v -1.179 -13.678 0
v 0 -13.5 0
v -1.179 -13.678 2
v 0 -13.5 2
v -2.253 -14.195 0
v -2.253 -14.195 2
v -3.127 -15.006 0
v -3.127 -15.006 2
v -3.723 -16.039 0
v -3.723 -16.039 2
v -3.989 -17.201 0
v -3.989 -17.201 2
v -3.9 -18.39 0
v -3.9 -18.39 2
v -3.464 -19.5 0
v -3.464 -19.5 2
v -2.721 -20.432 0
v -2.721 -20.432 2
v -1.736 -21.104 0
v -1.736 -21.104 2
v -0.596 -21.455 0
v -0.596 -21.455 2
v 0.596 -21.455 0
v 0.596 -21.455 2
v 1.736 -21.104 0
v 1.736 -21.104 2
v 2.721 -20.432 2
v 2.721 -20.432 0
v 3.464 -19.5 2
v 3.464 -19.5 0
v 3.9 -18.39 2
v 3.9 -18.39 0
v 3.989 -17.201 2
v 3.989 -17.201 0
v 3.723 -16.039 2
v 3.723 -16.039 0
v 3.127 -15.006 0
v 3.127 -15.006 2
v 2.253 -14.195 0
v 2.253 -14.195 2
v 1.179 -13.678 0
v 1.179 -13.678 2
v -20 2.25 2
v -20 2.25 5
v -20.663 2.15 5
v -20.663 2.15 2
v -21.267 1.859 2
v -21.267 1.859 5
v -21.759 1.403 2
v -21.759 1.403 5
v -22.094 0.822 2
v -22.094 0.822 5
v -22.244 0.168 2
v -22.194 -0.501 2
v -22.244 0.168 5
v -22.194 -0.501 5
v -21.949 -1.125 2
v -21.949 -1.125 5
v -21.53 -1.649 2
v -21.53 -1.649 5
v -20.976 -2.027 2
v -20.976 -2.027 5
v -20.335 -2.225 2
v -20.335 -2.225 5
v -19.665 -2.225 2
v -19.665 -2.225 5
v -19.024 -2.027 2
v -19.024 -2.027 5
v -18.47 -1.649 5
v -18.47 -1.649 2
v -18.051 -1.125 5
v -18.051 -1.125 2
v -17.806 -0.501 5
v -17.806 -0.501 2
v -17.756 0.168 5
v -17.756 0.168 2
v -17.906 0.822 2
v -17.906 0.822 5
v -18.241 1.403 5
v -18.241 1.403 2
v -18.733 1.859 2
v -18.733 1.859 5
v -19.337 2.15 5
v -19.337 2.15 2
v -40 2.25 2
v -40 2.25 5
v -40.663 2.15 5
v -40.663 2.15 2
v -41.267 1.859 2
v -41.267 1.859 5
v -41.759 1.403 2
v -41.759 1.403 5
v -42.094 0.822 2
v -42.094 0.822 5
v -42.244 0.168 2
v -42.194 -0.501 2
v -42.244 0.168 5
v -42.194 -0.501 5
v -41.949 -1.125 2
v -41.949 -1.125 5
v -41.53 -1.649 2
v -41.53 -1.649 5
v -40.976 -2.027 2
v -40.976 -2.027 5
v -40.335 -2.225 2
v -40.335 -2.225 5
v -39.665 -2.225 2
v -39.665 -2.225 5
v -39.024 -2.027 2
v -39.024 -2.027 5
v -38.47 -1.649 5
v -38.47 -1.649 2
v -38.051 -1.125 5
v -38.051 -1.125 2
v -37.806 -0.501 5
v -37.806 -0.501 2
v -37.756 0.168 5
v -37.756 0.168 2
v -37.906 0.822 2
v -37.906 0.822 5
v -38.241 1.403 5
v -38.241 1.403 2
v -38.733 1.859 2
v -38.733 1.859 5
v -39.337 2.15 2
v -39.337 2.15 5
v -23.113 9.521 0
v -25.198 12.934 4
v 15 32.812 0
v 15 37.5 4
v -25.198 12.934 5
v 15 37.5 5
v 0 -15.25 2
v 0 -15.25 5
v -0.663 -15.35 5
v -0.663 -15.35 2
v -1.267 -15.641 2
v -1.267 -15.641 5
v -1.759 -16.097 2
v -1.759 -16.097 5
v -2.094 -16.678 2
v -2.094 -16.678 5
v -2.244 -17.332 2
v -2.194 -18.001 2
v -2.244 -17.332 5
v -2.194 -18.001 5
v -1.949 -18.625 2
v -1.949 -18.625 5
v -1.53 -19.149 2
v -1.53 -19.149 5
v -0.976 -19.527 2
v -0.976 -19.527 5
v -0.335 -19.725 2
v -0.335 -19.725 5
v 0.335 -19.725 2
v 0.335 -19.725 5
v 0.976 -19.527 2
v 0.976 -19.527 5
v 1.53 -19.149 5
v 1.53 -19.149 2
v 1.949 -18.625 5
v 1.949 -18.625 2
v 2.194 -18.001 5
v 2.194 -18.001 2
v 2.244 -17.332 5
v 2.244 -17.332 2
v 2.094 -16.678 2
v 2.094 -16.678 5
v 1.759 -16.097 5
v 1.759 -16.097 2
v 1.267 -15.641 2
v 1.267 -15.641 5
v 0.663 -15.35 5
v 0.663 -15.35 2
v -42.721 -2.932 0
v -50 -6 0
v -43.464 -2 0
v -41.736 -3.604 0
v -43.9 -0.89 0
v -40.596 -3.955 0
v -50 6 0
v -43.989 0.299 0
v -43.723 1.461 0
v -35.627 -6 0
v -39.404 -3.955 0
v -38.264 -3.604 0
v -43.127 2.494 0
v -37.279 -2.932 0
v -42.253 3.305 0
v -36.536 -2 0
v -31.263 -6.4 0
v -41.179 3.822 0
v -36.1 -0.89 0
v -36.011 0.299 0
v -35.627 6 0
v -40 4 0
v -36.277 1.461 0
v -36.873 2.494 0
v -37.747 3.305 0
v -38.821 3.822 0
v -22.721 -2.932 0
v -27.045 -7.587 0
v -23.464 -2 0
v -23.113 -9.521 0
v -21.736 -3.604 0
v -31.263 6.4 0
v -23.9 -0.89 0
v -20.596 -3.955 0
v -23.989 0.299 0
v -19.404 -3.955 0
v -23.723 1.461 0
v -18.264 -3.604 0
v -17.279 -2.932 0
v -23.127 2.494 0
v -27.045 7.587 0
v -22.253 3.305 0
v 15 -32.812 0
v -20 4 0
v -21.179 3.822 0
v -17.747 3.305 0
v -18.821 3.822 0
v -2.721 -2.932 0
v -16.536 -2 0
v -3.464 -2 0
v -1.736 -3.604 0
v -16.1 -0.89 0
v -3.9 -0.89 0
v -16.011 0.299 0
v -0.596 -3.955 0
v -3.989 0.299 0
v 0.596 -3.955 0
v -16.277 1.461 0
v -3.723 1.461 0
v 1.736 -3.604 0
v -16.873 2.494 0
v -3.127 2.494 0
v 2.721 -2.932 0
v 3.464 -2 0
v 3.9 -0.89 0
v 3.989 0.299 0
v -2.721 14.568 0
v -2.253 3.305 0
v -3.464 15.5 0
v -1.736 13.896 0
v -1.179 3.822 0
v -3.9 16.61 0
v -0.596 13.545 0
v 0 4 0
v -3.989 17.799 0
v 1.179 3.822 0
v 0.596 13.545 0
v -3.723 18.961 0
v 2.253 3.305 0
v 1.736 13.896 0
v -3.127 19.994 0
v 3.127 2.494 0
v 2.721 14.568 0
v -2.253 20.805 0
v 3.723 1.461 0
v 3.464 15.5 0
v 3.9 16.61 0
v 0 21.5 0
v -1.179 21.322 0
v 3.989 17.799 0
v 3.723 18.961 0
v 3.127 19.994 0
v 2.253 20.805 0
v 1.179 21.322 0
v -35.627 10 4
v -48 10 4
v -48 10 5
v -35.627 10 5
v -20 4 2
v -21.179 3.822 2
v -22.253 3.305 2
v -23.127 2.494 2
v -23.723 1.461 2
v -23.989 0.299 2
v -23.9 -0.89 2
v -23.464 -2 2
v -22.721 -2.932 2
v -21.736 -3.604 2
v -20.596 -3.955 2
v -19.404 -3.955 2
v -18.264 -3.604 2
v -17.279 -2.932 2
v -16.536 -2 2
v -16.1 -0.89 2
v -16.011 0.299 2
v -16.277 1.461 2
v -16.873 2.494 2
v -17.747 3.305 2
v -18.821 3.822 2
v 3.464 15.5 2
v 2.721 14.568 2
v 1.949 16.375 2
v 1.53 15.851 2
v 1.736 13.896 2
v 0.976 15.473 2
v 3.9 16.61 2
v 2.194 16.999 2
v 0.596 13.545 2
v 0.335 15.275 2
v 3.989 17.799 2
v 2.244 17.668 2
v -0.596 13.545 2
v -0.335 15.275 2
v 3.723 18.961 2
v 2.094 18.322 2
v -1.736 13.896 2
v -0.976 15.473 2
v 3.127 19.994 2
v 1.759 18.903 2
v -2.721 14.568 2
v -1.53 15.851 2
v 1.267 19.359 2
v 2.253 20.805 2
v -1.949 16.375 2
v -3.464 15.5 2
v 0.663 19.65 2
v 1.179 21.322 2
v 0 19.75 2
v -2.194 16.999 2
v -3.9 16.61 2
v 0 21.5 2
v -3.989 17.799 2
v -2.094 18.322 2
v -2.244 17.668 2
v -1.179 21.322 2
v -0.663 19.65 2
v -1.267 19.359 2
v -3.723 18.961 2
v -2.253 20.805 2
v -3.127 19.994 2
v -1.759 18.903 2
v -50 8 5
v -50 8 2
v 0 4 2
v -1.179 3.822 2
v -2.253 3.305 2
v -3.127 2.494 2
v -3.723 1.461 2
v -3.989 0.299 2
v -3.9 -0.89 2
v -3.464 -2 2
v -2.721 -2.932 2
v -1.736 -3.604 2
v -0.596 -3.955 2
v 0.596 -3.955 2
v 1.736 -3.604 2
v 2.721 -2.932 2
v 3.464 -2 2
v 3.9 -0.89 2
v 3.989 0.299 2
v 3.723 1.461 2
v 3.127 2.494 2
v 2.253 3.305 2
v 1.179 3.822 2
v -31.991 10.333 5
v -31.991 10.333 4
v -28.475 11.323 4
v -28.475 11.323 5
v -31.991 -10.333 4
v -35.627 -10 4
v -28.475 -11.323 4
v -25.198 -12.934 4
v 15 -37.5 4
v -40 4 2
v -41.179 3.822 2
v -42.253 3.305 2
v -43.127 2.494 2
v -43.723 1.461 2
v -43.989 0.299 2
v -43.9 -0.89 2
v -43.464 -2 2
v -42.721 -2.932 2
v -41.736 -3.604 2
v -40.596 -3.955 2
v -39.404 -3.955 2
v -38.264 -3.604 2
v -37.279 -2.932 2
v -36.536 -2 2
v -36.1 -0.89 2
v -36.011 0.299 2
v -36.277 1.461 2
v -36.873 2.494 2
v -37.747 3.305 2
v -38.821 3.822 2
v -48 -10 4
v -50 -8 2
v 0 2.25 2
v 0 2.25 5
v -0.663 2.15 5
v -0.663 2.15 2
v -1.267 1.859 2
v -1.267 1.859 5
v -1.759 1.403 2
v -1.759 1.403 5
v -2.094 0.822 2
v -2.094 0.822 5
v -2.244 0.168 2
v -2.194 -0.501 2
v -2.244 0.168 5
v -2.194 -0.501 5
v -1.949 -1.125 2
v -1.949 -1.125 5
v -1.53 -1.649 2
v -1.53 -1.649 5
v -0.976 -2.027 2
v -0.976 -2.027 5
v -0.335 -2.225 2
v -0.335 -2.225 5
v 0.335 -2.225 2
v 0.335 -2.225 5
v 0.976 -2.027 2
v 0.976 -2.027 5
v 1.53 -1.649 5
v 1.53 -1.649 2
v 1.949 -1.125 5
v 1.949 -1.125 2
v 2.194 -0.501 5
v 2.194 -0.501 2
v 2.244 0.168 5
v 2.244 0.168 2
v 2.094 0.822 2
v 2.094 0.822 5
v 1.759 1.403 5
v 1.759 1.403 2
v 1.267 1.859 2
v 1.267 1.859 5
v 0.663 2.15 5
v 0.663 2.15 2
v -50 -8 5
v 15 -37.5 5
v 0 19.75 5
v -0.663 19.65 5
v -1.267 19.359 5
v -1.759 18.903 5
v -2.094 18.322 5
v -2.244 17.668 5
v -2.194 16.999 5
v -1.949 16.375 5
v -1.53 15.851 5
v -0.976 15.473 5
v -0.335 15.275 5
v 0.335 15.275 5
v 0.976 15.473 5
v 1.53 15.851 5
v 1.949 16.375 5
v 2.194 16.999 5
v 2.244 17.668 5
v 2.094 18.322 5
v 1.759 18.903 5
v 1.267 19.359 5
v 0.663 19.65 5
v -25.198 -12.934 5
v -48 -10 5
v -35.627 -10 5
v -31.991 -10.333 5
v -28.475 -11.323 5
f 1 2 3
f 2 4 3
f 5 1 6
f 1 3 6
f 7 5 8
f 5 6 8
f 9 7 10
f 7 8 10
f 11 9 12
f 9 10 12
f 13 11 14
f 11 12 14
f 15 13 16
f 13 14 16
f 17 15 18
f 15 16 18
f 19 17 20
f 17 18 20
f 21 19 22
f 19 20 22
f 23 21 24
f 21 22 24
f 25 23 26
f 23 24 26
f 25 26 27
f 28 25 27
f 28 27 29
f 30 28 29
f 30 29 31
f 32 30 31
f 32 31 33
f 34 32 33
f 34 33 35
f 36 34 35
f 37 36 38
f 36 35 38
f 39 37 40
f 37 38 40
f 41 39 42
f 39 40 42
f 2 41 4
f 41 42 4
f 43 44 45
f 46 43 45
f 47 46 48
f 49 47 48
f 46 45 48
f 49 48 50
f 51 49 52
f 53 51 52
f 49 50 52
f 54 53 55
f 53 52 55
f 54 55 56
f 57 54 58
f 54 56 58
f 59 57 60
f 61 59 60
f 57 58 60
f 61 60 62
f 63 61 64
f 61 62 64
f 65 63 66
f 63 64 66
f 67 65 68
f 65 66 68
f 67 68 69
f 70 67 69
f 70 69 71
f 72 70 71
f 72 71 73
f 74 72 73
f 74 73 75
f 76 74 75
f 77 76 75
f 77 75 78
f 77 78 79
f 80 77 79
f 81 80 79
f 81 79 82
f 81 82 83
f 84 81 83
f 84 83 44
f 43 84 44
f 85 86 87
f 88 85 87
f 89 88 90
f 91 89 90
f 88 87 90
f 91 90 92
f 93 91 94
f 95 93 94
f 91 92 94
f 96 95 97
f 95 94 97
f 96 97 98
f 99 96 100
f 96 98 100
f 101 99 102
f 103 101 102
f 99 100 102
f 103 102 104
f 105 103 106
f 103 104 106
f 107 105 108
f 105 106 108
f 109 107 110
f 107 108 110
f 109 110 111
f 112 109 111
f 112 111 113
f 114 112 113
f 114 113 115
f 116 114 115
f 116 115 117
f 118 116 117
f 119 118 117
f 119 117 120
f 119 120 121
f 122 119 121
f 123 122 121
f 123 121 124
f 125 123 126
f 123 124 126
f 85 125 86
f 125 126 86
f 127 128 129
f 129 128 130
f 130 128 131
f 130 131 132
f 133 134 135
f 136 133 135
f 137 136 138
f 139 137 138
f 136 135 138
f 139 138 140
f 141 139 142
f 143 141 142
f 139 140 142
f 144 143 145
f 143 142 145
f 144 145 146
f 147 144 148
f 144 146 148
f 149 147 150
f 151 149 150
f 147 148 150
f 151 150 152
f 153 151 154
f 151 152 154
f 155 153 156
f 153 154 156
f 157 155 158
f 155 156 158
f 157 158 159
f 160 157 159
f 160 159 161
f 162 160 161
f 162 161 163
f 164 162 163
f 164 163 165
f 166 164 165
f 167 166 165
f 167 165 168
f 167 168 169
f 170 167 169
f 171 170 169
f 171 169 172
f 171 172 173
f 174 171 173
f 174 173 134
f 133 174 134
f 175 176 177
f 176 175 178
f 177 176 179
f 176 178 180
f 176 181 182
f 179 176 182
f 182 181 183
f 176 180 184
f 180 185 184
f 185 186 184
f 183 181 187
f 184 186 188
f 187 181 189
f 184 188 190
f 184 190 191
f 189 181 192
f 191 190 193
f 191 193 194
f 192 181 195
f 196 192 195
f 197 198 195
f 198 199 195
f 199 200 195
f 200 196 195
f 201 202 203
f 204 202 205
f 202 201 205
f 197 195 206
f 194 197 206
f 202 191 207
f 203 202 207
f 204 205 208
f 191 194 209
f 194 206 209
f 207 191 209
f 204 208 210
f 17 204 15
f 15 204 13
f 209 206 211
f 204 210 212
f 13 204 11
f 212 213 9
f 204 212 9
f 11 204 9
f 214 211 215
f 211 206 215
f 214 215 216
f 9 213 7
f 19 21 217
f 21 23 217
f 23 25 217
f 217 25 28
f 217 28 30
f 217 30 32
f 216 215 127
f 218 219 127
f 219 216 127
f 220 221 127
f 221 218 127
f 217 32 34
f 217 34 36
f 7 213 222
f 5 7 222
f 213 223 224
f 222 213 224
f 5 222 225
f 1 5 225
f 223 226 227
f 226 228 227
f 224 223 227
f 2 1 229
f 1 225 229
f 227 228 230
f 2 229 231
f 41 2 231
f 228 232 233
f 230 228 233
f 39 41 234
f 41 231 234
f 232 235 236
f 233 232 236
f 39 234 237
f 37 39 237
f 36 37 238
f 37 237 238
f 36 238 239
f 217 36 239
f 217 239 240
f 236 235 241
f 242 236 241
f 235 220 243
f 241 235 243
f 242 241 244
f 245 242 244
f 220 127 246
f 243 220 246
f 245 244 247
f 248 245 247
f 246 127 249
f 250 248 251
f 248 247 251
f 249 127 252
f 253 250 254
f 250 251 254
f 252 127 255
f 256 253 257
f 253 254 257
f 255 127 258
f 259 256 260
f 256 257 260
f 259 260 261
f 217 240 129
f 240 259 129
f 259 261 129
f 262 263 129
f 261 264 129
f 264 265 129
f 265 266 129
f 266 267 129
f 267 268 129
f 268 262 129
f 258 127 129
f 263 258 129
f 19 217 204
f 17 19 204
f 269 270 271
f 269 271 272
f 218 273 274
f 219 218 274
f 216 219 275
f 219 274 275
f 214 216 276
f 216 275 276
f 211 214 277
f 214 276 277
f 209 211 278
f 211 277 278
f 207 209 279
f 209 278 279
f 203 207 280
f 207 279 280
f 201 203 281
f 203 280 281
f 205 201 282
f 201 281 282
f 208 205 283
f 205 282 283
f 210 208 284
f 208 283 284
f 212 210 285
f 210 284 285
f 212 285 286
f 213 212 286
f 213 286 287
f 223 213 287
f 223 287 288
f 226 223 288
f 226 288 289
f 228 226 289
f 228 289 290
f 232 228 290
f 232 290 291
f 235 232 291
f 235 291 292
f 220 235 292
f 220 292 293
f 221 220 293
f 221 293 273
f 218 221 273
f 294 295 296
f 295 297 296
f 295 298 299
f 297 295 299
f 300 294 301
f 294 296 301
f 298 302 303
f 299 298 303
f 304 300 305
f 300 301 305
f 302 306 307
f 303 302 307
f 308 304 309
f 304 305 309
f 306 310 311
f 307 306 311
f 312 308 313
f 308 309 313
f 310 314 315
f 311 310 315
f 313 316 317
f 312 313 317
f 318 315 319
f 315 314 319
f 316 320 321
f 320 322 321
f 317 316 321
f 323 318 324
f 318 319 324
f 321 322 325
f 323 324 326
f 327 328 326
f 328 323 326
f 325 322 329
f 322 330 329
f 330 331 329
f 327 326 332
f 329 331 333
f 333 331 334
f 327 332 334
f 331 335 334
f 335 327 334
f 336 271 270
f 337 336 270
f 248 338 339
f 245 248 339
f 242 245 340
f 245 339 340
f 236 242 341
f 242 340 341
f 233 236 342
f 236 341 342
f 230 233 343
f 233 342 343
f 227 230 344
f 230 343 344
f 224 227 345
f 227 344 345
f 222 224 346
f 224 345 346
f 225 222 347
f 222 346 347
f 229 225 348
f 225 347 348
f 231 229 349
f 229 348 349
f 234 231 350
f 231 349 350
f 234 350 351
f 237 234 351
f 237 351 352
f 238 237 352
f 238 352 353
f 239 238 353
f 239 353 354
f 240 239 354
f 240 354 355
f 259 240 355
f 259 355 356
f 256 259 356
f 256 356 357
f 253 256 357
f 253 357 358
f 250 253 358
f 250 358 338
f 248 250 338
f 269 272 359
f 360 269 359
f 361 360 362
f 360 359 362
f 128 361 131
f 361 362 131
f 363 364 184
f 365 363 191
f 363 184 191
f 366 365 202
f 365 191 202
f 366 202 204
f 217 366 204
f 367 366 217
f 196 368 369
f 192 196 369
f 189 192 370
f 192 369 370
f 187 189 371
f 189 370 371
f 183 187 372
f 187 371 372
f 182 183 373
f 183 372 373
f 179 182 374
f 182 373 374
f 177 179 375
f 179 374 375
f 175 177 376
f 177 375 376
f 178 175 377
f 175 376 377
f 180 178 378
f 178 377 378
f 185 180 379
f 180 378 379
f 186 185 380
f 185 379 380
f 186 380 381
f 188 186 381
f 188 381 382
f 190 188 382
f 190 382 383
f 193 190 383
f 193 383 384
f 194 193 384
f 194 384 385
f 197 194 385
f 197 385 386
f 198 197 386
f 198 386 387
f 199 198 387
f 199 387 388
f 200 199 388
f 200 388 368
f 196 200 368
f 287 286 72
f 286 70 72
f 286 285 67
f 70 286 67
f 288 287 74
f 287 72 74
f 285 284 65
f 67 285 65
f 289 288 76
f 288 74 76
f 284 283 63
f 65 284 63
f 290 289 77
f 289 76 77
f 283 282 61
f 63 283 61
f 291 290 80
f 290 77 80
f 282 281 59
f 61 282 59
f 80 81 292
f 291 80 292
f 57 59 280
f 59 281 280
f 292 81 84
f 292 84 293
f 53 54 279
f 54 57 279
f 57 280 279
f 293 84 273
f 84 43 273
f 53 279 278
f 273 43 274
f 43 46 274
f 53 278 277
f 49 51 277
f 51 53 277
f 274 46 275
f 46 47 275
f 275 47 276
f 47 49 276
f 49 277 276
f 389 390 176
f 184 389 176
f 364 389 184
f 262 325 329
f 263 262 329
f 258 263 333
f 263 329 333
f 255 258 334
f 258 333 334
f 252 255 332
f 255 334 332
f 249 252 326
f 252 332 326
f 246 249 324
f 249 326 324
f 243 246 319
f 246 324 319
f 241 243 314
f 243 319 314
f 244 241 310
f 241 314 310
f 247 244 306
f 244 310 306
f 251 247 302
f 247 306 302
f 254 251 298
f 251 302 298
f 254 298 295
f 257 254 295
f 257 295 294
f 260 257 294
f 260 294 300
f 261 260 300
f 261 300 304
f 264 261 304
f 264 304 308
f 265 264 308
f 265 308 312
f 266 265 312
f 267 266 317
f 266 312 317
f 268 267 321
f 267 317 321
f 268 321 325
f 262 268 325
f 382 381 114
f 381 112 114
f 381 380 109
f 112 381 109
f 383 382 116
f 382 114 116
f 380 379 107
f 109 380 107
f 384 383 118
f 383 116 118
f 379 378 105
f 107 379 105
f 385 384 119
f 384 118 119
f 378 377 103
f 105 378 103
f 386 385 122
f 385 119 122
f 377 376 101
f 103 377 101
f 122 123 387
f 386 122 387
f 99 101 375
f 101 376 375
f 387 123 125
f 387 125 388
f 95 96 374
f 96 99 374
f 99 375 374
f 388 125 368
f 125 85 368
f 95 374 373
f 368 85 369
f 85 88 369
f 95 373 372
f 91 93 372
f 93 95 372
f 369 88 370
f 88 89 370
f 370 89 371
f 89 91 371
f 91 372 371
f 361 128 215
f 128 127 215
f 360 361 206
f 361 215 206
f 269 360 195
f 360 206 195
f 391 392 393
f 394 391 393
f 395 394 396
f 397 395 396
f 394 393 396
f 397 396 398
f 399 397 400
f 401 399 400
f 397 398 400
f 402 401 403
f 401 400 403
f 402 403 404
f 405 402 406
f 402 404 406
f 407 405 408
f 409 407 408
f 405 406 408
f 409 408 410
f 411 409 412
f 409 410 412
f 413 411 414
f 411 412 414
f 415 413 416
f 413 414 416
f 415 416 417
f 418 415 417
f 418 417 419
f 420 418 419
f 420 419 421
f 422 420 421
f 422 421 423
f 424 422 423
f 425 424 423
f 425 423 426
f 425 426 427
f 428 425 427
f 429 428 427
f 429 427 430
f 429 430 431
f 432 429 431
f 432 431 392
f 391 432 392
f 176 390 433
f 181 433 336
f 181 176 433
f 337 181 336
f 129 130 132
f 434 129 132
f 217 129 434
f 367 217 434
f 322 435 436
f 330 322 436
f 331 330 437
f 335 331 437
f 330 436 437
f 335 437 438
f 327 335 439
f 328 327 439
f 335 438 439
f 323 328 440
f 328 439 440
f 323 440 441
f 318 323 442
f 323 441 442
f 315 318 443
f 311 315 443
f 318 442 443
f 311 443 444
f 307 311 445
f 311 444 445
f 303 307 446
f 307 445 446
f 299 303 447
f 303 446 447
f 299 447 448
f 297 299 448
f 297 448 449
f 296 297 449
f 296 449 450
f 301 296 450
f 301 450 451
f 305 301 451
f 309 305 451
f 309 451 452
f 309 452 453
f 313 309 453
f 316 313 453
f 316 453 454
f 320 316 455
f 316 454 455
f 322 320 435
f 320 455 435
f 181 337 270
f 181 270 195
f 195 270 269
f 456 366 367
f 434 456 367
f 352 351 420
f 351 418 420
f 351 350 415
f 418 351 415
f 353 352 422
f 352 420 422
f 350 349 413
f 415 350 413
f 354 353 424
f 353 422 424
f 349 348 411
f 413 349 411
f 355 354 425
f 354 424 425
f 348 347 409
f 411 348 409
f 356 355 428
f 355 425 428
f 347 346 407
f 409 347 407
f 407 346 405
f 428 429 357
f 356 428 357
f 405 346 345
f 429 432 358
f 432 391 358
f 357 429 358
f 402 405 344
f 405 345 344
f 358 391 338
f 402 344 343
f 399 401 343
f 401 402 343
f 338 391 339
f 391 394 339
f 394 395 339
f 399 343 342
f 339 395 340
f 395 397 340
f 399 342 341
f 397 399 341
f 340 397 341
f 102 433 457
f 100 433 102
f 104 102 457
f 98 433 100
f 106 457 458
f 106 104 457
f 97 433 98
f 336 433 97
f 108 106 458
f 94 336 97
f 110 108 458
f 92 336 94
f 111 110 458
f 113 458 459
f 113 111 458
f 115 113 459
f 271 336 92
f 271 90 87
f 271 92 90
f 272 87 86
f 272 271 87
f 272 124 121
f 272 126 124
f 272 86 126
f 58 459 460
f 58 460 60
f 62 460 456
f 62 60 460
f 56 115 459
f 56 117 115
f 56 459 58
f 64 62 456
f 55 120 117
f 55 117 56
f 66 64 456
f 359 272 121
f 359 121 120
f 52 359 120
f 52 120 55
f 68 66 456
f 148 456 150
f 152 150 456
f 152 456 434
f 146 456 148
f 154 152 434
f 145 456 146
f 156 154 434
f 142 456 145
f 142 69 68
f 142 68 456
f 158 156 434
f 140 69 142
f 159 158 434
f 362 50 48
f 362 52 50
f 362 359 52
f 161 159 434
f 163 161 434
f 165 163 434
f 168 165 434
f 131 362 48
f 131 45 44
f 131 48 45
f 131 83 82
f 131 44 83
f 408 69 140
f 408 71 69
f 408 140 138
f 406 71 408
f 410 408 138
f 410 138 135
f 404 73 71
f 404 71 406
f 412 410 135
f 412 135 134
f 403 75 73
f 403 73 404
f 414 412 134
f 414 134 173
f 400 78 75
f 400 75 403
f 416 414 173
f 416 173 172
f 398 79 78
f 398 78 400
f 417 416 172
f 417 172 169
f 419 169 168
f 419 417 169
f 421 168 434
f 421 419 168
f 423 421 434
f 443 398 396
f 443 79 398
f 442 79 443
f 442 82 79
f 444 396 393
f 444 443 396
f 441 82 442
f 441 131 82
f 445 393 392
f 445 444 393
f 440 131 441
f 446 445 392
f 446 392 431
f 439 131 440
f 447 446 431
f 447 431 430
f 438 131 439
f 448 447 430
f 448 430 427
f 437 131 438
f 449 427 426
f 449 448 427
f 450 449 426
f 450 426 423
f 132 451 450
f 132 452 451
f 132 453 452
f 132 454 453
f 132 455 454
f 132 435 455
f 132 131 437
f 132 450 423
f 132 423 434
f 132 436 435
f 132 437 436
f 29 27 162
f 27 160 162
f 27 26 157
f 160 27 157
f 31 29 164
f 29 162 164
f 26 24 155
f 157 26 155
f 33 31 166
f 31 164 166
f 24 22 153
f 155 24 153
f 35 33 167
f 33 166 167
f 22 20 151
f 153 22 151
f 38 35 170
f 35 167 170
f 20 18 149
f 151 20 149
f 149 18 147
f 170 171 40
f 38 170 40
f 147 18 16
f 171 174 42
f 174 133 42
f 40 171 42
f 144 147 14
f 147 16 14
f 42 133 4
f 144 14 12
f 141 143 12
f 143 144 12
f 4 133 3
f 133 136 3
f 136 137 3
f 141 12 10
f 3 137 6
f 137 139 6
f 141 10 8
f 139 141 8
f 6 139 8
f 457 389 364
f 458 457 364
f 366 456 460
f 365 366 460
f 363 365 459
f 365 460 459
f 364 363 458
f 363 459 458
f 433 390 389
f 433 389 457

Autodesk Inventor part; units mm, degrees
ref_plane "YZ Plane" through (0, 0, 0) normal (1, 0, 0) x (0, 1, 0)
ref_plane "XZ Plane" through (0, 0, 0) normal (0, 1, 0) x (-1, 0, 0)
ref_plane "XY Plane" through (0, 0, 0) normal (0, 0, 1) x (1, 0, 0)
sketch "Sketch1" plane through (0, 0, 0) normal (0, 0, 1) x (1, 0, 0)
  line L0 (0, 0) -> (-50, 0) construction
  line L1 (-50, 0) -> (-50, 10)
  line L2 (-50, 0) -> (-50, -10)
  line L3 (-50, -10) -> (-30, -10)
  line L4 (-30, -10) -> (15, -37.5)
  line L5 (-50, 10) -> (-30, 10)
  line L6 (-30, 10) -> (15, 37.5)
  line L7 (15, 37.5) -> (15, -37.5)
  line L8 (0, 0) -> (15, 0) construction
  line L9 (0, 17.5) -> (0, -17.5) construction
  line L10 (-30, 10) -> (40, 10)
  line L11 (-30, -10) -> (40, -10)
  line L12 (40, 10) -> (40, -10)
  circle A0 centre (35, 0) radius 2.25
  circle A1 centre (15, 0) radius 2.25
  line L13 (35, 2.25) -> (15, 2.25)
  line L14 (15, -2.25) -> (35, -2.25)
  point P0 (-40, 0)
  point P1 (40, 0)
  point P2 (15, -10)
  point P3 (15, 10)
  point P4 (-20, 0)
  dimension "d0" = 20
  dimension "d1" = 65
  dimension "d2" = 50
  dimension "d4" = 20
  dimension "d5" = 75
  dimension "d6" = 35
  dimension "d9" = 40
  dimension "d21" = 25
  dimension "d22" = 5
  dimension "d23" = 4.5
  dimension "d30" = 20
extrude "Extrusion1" add sketch "Sketch1" along normal blind 5 contours L1 L5 L10 L7 A1 L11 L3 L2 | L6 L7 L10 | L11 L7 L4 | L7 A1 picked at (13.9746, 0.6255)
hole "Hole1" at (0, 17.5, 0) at (0, -17.5, 0) at (-40, 0, 0) at (0, 0, 0) at (-20, 0, 0) direction (0, 0, 1) diameter 4.5 end through all counterbore diameter 8 counterbore depth 2
fillet "Fillet1" radius 20 2 edges at (-30, 10, 2.5) (-30, -10, 2.5)
chamfer "Chamfer1" distance 2 angle 45 2 edges at (-50, 10, 2.5) (-50, -10, 2.5)
chamfer "Chamfer3" distance 4 angle 45 4 edges at (-5.0992, 25.2172, 0) (-41.8137, 10, 0) (-41.8137, -10, 0) (-5.0992, -25.2172, 0)
properties part number "Y Axis Bearing Holder_3DPrint"
